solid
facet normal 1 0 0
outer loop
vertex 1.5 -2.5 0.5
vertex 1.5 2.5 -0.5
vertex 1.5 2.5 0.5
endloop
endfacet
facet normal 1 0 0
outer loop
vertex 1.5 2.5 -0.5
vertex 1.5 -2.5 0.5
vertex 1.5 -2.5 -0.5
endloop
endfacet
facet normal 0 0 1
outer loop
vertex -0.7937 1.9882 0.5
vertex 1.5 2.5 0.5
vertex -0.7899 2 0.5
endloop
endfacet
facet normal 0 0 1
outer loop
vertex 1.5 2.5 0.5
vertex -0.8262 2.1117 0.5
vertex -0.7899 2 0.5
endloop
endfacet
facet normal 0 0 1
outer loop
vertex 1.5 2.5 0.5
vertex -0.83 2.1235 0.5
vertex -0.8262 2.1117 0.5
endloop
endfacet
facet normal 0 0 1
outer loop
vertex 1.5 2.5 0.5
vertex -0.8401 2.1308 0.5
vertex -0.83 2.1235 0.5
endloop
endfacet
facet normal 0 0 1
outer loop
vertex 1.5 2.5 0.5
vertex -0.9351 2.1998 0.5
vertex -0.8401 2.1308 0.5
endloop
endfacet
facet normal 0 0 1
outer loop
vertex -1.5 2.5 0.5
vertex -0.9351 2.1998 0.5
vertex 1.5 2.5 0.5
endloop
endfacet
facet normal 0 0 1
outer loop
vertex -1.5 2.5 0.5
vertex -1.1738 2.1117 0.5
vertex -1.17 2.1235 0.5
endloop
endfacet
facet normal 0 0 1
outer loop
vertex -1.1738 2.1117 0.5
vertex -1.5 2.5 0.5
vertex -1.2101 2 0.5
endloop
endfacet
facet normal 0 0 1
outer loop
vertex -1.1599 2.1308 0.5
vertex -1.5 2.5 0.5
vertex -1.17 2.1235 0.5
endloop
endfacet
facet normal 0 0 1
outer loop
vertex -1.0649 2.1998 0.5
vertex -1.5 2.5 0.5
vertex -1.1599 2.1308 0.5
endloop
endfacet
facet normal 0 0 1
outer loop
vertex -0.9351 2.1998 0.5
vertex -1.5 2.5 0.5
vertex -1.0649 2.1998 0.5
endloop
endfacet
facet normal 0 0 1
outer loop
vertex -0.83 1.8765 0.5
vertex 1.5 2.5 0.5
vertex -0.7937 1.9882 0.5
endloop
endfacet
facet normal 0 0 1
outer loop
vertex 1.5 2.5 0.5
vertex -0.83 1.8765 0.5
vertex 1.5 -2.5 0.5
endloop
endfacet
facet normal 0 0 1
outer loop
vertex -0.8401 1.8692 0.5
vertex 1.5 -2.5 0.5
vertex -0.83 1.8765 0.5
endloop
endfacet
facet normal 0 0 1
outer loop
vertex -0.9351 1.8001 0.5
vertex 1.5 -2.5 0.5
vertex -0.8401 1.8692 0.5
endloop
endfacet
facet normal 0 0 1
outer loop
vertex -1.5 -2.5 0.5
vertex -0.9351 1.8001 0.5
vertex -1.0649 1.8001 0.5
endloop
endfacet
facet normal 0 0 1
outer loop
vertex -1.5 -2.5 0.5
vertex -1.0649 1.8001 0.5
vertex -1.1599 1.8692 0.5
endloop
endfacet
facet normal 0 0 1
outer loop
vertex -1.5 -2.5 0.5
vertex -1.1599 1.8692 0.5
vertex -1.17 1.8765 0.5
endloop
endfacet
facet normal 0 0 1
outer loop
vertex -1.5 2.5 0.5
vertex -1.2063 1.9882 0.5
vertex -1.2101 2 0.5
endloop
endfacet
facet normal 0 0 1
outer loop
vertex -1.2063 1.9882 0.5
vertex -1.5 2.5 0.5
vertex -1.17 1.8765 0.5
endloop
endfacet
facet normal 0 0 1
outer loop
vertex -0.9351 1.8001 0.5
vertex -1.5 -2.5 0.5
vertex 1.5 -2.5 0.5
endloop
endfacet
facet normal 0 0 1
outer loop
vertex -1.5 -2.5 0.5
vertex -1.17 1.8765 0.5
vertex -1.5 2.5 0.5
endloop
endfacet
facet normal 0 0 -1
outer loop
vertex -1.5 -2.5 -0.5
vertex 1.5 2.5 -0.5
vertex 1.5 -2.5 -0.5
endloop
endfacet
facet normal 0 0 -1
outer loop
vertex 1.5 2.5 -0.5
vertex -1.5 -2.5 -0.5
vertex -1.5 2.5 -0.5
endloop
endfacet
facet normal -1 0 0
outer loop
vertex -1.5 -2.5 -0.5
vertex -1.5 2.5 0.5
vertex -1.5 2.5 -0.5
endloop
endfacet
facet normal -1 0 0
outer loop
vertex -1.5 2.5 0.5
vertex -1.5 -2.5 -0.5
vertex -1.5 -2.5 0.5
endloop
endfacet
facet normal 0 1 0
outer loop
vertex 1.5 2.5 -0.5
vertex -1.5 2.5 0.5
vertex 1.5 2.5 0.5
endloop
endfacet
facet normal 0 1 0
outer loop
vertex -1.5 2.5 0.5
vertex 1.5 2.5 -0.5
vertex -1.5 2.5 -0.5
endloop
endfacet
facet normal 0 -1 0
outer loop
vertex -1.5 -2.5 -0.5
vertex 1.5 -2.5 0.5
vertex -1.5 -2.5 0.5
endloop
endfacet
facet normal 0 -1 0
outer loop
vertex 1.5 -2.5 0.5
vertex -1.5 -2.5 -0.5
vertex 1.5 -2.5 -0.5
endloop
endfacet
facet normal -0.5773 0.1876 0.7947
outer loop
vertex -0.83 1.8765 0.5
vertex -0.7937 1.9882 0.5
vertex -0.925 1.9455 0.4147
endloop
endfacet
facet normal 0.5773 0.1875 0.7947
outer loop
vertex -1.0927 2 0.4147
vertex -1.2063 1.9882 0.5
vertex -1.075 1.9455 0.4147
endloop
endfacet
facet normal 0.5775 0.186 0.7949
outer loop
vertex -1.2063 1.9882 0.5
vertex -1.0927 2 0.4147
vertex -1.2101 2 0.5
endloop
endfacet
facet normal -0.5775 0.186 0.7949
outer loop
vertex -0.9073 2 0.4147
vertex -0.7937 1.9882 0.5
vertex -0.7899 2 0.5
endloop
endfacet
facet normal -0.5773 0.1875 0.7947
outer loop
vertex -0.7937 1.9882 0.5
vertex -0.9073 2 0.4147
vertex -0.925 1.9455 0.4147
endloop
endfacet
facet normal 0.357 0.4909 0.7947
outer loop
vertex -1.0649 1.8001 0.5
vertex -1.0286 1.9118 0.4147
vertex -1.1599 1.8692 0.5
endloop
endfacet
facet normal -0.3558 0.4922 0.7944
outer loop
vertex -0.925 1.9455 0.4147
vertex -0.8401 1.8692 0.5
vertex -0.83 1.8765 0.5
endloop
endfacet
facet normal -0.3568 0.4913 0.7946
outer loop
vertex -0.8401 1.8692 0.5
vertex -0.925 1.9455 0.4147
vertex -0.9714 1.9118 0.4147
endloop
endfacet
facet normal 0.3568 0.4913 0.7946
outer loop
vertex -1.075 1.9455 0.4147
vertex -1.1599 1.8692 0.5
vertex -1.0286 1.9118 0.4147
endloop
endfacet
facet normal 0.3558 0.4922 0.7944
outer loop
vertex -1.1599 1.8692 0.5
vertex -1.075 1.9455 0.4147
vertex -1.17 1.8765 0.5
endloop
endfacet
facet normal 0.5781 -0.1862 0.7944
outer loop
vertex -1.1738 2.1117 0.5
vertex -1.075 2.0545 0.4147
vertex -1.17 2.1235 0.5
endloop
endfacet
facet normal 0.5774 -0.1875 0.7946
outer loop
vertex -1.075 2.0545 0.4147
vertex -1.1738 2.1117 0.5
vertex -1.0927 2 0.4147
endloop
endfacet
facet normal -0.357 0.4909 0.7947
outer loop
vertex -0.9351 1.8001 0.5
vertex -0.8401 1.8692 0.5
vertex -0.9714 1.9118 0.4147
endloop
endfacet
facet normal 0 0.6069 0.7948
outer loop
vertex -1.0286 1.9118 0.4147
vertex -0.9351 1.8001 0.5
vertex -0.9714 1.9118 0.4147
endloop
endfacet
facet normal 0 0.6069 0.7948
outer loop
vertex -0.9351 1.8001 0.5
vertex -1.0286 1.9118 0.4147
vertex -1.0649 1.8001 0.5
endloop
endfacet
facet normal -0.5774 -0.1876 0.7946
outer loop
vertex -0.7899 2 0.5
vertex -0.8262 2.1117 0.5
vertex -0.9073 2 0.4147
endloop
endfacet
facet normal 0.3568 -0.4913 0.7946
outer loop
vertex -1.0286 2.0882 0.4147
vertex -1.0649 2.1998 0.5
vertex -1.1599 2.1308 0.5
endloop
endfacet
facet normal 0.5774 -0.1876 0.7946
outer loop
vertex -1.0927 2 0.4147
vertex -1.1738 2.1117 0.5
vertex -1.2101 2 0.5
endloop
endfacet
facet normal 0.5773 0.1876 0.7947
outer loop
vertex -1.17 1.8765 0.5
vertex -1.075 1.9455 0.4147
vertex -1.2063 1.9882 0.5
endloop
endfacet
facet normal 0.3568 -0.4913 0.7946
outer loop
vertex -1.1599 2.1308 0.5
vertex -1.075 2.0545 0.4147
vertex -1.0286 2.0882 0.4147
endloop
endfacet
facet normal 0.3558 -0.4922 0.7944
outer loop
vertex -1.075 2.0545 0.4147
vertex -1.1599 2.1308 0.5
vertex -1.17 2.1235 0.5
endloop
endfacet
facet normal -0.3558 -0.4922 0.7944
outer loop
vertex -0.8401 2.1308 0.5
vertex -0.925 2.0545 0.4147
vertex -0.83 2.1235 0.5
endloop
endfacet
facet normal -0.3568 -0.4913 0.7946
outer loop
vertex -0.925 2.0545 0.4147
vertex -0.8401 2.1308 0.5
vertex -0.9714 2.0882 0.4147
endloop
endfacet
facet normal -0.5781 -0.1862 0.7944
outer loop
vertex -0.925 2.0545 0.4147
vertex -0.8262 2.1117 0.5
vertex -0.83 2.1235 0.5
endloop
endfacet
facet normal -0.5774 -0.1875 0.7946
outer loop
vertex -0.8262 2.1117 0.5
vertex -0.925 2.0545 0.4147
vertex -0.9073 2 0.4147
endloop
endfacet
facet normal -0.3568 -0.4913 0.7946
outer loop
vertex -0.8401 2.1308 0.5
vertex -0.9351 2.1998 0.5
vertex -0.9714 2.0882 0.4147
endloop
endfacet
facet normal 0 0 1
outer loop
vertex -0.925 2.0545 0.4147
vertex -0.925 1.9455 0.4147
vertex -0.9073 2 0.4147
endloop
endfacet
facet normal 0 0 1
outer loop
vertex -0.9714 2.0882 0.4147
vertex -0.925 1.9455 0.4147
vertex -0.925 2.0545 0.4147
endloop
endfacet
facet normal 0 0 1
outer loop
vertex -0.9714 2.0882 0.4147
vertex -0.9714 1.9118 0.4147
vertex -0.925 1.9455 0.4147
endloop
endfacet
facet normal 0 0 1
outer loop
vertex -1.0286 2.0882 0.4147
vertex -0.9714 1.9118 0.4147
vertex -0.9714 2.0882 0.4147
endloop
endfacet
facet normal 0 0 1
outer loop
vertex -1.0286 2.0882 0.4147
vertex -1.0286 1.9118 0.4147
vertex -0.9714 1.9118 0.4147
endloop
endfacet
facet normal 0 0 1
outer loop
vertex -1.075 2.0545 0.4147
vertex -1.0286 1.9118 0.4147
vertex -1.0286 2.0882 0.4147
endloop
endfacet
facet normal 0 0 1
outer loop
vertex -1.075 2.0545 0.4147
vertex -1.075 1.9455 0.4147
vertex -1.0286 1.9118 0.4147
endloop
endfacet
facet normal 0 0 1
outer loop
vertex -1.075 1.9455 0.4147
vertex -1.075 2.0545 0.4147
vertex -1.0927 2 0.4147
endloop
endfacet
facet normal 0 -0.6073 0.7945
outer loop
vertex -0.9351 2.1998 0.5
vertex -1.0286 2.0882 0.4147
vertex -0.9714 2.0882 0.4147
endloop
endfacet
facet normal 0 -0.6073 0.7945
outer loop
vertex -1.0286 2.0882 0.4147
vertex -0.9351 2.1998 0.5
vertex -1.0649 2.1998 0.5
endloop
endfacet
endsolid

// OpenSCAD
/*
 * Creates the Analog Devices ADXL345 accelerometer.
 *
 * Author: Ian McInerney
 * Created: June 21, 2013
 */

// Create the chip
difference() {
	// The main chip body
	cube(size=[3.0,5.0,1.0], center=true);

	// The bump to indicate pin 1
	translate([-1.0,2.0,0.70])sphere(r=0.3, center=true, $fn=10);
}
